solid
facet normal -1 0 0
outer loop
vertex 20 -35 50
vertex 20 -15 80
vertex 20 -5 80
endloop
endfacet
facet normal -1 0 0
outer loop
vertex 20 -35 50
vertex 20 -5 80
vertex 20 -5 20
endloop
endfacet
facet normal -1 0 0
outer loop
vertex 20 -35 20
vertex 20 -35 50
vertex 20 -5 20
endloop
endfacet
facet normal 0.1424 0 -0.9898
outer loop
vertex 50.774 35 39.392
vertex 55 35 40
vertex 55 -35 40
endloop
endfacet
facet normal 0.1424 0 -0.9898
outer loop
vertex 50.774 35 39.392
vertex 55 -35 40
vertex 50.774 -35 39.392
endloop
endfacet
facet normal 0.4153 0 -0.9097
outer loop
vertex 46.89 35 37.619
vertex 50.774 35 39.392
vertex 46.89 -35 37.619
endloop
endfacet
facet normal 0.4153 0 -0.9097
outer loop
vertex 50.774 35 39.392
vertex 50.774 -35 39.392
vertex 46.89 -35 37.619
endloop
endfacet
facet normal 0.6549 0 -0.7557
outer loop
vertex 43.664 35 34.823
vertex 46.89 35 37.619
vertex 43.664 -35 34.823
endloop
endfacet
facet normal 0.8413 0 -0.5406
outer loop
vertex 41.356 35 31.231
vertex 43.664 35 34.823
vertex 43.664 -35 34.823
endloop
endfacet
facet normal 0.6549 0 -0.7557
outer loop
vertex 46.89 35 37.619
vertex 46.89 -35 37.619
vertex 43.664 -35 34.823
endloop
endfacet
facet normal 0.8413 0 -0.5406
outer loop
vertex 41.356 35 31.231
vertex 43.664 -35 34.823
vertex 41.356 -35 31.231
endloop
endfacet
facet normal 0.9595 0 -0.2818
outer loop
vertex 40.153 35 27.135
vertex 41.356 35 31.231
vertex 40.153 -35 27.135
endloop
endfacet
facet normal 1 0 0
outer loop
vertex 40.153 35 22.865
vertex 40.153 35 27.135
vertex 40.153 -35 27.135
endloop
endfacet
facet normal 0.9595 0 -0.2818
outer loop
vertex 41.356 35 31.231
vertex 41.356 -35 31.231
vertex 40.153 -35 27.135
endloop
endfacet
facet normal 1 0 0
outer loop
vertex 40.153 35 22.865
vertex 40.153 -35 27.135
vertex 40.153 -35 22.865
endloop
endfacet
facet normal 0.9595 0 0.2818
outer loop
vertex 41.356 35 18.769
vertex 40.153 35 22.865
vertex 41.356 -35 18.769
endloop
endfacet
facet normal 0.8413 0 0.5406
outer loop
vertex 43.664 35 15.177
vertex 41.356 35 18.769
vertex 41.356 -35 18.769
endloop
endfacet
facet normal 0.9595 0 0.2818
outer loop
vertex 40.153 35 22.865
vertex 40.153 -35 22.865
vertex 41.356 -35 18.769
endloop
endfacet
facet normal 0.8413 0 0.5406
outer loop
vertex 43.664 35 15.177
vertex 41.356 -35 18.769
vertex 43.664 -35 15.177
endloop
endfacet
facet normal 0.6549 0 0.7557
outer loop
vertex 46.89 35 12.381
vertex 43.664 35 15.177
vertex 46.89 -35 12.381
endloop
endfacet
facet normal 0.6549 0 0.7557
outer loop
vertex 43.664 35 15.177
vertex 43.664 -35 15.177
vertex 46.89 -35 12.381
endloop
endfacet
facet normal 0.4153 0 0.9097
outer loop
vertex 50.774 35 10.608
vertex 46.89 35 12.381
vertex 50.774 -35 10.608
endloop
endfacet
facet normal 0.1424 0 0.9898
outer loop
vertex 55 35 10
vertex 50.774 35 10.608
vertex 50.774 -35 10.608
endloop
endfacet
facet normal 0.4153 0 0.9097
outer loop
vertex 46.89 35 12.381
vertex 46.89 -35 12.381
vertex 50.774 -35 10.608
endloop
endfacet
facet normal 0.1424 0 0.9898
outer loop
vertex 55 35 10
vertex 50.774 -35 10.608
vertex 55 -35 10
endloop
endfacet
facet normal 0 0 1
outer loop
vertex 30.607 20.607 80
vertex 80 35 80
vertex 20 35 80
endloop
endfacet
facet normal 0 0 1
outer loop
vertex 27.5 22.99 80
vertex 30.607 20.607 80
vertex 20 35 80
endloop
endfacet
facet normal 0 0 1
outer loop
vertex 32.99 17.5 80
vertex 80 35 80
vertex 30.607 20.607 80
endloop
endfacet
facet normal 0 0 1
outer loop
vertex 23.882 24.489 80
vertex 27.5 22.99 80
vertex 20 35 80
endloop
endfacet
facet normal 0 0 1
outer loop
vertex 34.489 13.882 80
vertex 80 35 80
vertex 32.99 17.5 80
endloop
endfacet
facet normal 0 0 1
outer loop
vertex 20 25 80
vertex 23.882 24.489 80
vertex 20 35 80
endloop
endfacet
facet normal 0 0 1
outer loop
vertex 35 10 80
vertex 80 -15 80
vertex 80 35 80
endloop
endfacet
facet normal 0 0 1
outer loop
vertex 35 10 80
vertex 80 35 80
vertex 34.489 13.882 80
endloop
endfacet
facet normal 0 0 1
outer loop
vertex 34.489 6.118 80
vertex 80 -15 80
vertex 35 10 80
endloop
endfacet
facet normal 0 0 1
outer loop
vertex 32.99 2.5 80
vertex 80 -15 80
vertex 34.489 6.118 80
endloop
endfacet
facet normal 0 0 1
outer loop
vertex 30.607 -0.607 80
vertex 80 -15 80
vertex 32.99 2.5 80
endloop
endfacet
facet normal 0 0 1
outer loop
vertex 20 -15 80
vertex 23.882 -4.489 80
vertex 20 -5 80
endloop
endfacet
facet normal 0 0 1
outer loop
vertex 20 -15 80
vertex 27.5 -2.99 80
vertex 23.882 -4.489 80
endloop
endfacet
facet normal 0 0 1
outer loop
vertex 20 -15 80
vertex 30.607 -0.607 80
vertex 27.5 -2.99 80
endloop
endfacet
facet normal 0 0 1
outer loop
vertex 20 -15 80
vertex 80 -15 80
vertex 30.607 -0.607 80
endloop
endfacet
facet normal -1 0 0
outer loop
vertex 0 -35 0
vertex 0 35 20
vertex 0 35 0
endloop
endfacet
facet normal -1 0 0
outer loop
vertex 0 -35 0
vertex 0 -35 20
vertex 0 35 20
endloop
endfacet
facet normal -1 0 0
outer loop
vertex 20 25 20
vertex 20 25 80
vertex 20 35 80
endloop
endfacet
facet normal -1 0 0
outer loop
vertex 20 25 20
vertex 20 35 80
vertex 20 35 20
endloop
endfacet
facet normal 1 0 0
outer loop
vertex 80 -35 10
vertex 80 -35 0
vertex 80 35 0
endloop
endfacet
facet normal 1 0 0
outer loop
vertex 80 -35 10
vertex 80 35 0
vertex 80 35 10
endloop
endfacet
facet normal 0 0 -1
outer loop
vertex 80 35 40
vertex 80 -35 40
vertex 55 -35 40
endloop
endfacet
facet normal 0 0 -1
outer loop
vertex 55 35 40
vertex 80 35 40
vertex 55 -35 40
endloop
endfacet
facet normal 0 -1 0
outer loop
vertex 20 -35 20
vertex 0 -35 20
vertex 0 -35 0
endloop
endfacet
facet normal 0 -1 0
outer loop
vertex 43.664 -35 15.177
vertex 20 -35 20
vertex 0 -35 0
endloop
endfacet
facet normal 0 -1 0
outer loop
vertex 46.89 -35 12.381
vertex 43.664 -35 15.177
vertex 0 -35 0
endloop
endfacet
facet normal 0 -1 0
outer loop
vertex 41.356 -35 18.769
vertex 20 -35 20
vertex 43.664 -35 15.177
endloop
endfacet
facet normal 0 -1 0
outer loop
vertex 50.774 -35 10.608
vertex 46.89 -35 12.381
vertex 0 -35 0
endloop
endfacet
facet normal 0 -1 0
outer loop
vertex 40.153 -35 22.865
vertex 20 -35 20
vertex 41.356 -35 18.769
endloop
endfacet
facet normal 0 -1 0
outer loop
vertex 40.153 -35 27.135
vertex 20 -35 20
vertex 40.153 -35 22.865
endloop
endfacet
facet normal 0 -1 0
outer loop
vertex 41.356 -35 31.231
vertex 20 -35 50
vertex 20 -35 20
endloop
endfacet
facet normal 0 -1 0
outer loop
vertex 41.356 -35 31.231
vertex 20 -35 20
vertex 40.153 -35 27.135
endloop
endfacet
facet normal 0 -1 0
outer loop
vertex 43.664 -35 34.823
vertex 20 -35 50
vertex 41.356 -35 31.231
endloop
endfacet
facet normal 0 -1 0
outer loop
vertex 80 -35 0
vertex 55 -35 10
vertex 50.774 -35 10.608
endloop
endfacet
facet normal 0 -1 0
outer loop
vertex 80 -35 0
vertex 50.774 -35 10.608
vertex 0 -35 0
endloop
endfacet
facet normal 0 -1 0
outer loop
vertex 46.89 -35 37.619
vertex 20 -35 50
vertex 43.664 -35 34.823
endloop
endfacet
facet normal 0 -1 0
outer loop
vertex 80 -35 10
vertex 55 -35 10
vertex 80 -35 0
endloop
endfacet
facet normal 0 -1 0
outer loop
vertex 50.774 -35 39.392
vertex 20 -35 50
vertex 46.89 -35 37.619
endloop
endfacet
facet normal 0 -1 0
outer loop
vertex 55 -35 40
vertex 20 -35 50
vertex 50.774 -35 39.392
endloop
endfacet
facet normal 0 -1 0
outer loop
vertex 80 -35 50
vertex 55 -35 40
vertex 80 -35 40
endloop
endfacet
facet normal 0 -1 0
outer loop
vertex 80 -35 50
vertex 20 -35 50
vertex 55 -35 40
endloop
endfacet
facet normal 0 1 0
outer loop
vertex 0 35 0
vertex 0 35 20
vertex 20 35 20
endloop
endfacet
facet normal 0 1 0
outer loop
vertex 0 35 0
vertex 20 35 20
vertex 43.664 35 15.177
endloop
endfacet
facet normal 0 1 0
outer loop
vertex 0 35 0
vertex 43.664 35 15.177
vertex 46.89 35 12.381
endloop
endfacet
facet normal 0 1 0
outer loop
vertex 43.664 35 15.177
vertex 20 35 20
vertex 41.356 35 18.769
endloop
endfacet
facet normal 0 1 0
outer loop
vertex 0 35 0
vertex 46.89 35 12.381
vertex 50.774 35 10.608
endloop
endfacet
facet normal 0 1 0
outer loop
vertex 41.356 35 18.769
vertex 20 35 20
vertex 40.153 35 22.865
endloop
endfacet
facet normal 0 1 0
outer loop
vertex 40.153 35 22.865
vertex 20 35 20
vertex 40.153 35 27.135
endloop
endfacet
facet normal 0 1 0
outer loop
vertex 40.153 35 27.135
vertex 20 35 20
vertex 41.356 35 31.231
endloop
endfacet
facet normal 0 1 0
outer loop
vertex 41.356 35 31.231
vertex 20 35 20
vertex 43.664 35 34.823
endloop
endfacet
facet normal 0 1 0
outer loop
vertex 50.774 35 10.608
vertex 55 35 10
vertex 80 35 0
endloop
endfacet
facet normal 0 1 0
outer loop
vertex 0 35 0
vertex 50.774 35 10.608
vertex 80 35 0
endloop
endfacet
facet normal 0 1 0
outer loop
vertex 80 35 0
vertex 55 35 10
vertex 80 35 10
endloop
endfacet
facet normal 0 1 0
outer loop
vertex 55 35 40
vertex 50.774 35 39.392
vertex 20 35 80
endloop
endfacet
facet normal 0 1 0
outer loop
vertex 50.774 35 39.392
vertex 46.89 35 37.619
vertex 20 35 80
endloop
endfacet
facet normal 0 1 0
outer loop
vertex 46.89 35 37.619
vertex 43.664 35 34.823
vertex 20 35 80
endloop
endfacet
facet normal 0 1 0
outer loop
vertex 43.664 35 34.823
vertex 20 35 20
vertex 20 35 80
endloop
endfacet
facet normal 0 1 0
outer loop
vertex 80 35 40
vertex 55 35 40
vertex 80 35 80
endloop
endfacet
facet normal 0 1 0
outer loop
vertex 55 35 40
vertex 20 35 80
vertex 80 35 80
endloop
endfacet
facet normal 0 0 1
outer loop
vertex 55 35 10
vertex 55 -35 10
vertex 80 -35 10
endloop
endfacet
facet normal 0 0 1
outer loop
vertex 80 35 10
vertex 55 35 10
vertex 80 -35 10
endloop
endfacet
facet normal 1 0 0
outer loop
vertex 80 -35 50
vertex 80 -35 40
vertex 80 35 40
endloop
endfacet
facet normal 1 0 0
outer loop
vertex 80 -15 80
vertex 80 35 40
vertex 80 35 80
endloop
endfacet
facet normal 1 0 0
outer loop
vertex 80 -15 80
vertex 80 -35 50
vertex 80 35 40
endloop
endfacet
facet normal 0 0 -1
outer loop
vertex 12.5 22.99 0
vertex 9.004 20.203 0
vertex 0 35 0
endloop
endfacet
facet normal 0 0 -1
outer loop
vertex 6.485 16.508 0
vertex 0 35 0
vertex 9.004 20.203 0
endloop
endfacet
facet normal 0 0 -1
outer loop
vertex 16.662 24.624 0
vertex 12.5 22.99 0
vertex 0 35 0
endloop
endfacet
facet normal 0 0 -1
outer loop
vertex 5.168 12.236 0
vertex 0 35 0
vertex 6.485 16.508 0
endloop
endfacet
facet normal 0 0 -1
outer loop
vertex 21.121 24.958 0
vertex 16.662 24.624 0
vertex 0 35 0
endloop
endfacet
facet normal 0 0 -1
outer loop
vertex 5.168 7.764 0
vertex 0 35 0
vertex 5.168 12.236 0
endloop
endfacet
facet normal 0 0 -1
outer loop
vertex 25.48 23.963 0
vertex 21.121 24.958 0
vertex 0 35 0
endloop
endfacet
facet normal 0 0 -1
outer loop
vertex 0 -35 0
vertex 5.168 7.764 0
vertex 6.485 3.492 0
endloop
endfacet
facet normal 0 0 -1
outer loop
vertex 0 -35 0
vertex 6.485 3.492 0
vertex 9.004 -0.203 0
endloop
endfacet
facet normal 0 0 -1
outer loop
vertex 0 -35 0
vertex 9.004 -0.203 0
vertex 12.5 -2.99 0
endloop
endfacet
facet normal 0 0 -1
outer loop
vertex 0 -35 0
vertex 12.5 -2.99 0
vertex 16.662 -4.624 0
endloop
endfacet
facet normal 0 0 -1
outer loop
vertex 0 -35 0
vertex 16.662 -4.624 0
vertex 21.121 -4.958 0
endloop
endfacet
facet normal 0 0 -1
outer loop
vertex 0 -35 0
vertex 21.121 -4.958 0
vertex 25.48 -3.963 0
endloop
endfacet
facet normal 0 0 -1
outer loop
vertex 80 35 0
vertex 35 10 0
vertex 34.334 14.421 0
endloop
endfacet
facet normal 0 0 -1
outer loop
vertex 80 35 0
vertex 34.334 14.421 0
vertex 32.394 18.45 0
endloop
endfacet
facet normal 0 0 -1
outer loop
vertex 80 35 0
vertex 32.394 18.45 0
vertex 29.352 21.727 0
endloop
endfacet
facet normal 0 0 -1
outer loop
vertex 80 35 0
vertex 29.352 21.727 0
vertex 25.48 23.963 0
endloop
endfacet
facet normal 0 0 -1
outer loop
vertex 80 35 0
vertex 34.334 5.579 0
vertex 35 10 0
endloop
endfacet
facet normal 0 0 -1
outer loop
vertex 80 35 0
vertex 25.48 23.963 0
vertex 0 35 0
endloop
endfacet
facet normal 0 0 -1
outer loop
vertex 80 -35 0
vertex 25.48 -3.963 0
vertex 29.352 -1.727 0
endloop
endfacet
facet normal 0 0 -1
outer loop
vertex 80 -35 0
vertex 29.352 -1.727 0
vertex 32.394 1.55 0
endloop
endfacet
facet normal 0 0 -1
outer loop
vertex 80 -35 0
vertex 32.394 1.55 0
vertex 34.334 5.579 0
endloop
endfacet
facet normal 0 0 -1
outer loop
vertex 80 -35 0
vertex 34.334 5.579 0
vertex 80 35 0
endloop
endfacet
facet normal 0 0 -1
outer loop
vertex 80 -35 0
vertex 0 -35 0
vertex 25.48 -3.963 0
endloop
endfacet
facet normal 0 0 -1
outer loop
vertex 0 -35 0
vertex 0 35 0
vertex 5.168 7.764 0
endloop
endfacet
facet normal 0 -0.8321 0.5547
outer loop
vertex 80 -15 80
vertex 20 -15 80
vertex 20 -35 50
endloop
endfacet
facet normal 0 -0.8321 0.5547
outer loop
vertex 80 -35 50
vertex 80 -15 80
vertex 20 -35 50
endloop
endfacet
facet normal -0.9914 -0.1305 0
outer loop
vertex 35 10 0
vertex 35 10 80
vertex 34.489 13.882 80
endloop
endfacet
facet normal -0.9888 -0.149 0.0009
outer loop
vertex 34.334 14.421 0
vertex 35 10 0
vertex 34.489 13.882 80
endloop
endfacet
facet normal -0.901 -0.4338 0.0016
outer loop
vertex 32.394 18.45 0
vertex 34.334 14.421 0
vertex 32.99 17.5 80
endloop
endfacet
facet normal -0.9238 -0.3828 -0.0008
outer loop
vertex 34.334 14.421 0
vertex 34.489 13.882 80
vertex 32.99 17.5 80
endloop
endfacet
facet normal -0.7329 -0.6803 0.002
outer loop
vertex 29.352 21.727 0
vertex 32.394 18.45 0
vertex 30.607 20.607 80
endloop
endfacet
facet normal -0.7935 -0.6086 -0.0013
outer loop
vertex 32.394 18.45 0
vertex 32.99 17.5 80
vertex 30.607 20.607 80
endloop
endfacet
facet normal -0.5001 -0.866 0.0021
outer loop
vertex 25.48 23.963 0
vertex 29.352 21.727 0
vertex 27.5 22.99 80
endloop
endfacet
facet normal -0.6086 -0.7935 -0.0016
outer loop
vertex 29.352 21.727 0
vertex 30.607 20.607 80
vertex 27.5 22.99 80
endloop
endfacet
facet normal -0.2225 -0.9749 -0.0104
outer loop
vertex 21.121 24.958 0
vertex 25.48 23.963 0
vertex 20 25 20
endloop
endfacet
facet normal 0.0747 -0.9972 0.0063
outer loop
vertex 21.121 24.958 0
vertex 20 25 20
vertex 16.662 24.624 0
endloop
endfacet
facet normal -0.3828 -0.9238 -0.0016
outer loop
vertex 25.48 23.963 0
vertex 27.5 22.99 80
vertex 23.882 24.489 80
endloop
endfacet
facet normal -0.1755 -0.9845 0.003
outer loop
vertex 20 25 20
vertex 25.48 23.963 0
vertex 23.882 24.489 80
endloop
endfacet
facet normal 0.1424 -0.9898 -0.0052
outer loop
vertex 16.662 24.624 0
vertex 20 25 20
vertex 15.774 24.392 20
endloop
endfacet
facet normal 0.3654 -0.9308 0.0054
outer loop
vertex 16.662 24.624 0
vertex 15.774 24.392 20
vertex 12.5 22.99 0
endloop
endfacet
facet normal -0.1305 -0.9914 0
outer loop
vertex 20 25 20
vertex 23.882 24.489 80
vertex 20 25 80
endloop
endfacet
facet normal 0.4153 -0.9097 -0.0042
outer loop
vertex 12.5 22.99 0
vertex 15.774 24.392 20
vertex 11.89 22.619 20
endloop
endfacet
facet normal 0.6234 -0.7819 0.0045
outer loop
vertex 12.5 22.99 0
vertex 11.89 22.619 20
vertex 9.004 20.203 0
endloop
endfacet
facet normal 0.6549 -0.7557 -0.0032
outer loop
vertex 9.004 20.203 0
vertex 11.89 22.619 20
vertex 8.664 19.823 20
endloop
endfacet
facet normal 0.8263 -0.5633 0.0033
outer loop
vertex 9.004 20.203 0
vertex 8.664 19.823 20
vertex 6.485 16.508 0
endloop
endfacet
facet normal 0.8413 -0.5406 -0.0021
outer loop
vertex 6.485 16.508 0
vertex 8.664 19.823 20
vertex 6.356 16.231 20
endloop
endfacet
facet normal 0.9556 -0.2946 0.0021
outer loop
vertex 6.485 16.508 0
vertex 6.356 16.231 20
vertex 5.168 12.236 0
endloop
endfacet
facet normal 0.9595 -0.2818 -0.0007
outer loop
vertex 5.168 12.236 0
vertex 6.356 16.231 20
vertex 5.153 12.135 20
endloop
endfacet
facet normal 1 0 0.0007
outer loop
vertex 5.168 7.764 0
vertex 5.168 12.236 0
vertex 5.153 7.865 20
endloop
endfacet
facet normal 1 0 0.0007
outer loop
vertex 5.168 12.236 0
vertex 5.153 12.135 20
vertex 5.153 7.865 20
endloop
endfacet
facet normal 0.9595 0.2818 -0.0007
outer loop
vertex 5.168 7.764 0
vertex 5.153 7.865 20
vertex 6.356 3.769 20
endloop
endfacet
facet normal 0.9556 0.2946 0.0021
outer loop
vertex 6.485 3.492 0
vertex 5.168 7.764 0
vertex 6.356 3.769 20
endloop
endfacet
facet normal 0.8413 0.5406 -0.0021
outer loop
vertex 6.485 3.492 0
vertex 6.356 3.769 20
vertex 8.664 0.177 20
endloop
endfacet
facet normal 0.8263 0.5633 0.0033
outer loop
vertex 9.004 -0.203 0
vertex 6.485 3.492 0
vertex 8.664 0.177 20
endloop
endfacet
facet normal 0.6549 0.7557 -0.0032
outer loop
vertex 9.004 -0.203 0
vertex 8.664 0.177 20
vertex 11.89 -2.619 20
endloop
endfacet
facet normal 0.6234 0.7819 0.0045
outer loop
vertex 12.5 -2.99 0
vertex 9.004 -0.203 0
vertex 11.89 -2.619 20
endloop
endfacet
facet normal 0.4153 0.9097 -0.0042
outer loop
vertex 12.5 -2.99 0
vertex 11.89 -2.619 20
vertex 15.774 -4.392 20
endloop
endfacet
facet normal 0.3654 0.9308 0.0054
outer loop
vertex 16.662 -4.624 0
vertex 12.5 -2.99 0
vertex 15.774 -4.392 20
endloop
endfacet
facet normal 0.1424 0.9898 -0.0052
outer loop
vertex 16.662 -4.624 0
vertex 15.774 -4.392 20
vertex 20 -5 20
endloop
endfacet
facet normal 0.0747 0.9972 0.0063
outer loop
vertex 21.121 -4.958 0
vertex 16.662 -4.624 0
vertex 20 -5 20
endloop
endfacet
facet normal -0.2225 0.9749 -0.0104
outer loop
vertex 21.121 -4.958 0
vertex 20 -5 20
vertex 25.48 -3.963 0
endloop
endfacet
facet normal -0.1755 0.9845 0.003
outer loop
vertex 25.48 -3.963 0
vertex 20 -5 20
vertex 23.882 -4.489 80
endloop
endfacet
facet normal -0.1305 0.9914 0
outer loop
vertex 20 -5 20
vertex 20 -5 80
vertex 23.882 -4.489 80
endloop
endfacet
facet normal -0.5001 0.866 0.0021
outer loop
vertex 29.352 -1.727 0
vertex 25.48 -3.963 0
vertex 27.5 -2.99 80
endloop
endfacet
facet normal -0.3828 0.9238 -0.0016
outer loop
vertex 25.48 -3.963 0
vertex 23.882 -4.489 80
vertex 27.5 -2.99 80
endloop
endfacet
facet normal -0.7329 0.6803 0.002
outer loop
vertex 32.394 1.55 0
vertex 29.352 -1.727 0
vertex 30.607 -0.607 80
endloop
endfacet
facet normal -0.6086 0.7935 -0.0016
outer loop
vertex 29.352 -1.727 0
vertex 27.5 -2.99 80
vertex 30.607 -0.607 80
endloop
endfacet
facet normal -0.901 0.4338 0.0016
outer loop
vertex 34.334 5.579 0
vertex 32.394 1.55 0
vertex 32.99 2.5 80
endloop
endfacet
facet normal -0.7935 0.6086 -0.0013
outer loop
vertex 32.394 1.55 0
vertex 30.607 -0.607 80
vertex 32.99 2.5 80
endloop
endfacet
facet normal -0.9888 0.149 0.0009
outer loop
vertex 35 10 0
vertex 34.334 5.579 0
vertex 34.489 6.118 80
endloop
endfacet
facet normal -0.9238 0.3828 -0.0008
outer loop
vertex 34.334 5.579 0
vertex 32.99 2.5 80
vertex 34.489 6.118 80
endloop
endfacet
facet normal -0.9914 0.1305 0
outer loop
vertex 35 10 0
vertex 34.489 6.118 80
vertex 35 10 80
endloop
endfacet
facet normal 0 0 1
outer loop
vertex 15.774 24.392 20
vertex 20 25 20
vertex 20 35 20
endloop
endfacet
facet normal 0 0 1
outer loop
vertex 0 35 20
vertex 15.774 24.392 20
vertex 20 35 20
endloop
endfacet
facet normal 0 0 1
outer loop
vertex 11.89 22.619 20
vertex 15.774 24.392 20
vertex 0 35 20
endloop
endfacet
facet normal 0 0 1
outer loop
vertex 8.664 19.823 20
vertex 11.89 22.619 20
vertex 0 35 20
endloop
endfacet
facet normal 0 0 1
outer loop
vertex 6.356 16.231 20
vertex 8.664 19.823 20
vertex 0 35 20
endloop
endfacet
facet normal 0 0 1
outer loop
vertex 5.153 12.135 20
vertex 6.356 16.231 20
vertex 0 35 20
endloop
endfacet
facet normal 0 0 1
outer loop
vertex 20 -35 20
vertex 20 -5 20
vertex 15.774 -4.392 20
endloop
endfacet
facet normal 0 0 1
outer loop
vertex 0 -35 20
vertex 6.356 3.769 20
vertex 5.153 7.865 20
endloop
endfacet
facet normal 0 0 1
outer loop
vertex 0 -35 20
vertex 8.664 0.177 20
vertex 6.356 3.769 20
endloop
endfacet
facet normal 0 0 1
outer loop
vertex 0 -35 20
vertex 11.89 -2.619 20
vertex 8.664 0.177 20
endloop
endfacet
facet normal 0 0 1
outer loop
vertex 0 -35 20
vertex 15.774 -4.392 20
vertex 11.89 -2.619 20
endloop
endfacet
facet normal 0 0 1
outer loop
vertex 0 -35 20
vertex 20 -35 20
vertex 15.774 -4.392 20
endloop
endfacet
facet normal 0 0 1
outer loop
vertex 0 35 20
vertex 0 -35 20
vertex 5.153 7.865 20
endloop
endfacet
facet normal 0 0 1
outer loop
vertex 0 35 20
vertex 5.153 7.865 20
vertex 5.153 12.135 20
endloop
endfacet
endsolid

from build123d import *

# Parameters (mm, degrees)
F1_DEPTH = 35
F3_DEPTH = 70
F4_R     = 15
F5_DEPTH = 80.001
F7_DEPTH = 60.001


with BuildPart() as f1:
    # F0 (on Front) → F1 (new body, symmetric)
    with BuildSketch(Plane.XZ):
        Polygon((0, 20), (0, 0), (80, 0), (80, 80), (20, 80), (20, 20), align=None)
    extrude(amount=F1_DEPTH, both=True)

    # F2 (on face) → F3 (cut, through all)
    with BuildSketch(Plane.XZ.offset(35)):
        with BuildLine():
            Line((80, 40), (55, 40))
            ThreePointArc((55, 40), (40, 25), (55, 10))
            Line((55, 10), (80, 10))
            Line((80, 10), (80, 40))
        make_face()
    extrude(amount=-F3_DEPTH, mode=Mode.SUBTRACT)

    # F4 (on face) → F5 (cut, through all)
    with BuildSketch(Plane.XY.offset(80)):
        with Locations((20, 10)):
            Circle(F4_R)
    extrude(amount=-F5_DEPTH, mode=Mode.SUBTRACT)

    # F6 (on face) → F7 (cut, through all)
    with BuildSketch(Plane(origin=(20, 0, 0), x_dir=(0, -1, 0), z_dir=(-1, 0, 0))):
        Polygon((35, 80), (15, 80), (35, 50), align=None)
    extrude(amount=-F7_DEPTH, mode=Mode.SUBTRACT)


solid = f1.part
